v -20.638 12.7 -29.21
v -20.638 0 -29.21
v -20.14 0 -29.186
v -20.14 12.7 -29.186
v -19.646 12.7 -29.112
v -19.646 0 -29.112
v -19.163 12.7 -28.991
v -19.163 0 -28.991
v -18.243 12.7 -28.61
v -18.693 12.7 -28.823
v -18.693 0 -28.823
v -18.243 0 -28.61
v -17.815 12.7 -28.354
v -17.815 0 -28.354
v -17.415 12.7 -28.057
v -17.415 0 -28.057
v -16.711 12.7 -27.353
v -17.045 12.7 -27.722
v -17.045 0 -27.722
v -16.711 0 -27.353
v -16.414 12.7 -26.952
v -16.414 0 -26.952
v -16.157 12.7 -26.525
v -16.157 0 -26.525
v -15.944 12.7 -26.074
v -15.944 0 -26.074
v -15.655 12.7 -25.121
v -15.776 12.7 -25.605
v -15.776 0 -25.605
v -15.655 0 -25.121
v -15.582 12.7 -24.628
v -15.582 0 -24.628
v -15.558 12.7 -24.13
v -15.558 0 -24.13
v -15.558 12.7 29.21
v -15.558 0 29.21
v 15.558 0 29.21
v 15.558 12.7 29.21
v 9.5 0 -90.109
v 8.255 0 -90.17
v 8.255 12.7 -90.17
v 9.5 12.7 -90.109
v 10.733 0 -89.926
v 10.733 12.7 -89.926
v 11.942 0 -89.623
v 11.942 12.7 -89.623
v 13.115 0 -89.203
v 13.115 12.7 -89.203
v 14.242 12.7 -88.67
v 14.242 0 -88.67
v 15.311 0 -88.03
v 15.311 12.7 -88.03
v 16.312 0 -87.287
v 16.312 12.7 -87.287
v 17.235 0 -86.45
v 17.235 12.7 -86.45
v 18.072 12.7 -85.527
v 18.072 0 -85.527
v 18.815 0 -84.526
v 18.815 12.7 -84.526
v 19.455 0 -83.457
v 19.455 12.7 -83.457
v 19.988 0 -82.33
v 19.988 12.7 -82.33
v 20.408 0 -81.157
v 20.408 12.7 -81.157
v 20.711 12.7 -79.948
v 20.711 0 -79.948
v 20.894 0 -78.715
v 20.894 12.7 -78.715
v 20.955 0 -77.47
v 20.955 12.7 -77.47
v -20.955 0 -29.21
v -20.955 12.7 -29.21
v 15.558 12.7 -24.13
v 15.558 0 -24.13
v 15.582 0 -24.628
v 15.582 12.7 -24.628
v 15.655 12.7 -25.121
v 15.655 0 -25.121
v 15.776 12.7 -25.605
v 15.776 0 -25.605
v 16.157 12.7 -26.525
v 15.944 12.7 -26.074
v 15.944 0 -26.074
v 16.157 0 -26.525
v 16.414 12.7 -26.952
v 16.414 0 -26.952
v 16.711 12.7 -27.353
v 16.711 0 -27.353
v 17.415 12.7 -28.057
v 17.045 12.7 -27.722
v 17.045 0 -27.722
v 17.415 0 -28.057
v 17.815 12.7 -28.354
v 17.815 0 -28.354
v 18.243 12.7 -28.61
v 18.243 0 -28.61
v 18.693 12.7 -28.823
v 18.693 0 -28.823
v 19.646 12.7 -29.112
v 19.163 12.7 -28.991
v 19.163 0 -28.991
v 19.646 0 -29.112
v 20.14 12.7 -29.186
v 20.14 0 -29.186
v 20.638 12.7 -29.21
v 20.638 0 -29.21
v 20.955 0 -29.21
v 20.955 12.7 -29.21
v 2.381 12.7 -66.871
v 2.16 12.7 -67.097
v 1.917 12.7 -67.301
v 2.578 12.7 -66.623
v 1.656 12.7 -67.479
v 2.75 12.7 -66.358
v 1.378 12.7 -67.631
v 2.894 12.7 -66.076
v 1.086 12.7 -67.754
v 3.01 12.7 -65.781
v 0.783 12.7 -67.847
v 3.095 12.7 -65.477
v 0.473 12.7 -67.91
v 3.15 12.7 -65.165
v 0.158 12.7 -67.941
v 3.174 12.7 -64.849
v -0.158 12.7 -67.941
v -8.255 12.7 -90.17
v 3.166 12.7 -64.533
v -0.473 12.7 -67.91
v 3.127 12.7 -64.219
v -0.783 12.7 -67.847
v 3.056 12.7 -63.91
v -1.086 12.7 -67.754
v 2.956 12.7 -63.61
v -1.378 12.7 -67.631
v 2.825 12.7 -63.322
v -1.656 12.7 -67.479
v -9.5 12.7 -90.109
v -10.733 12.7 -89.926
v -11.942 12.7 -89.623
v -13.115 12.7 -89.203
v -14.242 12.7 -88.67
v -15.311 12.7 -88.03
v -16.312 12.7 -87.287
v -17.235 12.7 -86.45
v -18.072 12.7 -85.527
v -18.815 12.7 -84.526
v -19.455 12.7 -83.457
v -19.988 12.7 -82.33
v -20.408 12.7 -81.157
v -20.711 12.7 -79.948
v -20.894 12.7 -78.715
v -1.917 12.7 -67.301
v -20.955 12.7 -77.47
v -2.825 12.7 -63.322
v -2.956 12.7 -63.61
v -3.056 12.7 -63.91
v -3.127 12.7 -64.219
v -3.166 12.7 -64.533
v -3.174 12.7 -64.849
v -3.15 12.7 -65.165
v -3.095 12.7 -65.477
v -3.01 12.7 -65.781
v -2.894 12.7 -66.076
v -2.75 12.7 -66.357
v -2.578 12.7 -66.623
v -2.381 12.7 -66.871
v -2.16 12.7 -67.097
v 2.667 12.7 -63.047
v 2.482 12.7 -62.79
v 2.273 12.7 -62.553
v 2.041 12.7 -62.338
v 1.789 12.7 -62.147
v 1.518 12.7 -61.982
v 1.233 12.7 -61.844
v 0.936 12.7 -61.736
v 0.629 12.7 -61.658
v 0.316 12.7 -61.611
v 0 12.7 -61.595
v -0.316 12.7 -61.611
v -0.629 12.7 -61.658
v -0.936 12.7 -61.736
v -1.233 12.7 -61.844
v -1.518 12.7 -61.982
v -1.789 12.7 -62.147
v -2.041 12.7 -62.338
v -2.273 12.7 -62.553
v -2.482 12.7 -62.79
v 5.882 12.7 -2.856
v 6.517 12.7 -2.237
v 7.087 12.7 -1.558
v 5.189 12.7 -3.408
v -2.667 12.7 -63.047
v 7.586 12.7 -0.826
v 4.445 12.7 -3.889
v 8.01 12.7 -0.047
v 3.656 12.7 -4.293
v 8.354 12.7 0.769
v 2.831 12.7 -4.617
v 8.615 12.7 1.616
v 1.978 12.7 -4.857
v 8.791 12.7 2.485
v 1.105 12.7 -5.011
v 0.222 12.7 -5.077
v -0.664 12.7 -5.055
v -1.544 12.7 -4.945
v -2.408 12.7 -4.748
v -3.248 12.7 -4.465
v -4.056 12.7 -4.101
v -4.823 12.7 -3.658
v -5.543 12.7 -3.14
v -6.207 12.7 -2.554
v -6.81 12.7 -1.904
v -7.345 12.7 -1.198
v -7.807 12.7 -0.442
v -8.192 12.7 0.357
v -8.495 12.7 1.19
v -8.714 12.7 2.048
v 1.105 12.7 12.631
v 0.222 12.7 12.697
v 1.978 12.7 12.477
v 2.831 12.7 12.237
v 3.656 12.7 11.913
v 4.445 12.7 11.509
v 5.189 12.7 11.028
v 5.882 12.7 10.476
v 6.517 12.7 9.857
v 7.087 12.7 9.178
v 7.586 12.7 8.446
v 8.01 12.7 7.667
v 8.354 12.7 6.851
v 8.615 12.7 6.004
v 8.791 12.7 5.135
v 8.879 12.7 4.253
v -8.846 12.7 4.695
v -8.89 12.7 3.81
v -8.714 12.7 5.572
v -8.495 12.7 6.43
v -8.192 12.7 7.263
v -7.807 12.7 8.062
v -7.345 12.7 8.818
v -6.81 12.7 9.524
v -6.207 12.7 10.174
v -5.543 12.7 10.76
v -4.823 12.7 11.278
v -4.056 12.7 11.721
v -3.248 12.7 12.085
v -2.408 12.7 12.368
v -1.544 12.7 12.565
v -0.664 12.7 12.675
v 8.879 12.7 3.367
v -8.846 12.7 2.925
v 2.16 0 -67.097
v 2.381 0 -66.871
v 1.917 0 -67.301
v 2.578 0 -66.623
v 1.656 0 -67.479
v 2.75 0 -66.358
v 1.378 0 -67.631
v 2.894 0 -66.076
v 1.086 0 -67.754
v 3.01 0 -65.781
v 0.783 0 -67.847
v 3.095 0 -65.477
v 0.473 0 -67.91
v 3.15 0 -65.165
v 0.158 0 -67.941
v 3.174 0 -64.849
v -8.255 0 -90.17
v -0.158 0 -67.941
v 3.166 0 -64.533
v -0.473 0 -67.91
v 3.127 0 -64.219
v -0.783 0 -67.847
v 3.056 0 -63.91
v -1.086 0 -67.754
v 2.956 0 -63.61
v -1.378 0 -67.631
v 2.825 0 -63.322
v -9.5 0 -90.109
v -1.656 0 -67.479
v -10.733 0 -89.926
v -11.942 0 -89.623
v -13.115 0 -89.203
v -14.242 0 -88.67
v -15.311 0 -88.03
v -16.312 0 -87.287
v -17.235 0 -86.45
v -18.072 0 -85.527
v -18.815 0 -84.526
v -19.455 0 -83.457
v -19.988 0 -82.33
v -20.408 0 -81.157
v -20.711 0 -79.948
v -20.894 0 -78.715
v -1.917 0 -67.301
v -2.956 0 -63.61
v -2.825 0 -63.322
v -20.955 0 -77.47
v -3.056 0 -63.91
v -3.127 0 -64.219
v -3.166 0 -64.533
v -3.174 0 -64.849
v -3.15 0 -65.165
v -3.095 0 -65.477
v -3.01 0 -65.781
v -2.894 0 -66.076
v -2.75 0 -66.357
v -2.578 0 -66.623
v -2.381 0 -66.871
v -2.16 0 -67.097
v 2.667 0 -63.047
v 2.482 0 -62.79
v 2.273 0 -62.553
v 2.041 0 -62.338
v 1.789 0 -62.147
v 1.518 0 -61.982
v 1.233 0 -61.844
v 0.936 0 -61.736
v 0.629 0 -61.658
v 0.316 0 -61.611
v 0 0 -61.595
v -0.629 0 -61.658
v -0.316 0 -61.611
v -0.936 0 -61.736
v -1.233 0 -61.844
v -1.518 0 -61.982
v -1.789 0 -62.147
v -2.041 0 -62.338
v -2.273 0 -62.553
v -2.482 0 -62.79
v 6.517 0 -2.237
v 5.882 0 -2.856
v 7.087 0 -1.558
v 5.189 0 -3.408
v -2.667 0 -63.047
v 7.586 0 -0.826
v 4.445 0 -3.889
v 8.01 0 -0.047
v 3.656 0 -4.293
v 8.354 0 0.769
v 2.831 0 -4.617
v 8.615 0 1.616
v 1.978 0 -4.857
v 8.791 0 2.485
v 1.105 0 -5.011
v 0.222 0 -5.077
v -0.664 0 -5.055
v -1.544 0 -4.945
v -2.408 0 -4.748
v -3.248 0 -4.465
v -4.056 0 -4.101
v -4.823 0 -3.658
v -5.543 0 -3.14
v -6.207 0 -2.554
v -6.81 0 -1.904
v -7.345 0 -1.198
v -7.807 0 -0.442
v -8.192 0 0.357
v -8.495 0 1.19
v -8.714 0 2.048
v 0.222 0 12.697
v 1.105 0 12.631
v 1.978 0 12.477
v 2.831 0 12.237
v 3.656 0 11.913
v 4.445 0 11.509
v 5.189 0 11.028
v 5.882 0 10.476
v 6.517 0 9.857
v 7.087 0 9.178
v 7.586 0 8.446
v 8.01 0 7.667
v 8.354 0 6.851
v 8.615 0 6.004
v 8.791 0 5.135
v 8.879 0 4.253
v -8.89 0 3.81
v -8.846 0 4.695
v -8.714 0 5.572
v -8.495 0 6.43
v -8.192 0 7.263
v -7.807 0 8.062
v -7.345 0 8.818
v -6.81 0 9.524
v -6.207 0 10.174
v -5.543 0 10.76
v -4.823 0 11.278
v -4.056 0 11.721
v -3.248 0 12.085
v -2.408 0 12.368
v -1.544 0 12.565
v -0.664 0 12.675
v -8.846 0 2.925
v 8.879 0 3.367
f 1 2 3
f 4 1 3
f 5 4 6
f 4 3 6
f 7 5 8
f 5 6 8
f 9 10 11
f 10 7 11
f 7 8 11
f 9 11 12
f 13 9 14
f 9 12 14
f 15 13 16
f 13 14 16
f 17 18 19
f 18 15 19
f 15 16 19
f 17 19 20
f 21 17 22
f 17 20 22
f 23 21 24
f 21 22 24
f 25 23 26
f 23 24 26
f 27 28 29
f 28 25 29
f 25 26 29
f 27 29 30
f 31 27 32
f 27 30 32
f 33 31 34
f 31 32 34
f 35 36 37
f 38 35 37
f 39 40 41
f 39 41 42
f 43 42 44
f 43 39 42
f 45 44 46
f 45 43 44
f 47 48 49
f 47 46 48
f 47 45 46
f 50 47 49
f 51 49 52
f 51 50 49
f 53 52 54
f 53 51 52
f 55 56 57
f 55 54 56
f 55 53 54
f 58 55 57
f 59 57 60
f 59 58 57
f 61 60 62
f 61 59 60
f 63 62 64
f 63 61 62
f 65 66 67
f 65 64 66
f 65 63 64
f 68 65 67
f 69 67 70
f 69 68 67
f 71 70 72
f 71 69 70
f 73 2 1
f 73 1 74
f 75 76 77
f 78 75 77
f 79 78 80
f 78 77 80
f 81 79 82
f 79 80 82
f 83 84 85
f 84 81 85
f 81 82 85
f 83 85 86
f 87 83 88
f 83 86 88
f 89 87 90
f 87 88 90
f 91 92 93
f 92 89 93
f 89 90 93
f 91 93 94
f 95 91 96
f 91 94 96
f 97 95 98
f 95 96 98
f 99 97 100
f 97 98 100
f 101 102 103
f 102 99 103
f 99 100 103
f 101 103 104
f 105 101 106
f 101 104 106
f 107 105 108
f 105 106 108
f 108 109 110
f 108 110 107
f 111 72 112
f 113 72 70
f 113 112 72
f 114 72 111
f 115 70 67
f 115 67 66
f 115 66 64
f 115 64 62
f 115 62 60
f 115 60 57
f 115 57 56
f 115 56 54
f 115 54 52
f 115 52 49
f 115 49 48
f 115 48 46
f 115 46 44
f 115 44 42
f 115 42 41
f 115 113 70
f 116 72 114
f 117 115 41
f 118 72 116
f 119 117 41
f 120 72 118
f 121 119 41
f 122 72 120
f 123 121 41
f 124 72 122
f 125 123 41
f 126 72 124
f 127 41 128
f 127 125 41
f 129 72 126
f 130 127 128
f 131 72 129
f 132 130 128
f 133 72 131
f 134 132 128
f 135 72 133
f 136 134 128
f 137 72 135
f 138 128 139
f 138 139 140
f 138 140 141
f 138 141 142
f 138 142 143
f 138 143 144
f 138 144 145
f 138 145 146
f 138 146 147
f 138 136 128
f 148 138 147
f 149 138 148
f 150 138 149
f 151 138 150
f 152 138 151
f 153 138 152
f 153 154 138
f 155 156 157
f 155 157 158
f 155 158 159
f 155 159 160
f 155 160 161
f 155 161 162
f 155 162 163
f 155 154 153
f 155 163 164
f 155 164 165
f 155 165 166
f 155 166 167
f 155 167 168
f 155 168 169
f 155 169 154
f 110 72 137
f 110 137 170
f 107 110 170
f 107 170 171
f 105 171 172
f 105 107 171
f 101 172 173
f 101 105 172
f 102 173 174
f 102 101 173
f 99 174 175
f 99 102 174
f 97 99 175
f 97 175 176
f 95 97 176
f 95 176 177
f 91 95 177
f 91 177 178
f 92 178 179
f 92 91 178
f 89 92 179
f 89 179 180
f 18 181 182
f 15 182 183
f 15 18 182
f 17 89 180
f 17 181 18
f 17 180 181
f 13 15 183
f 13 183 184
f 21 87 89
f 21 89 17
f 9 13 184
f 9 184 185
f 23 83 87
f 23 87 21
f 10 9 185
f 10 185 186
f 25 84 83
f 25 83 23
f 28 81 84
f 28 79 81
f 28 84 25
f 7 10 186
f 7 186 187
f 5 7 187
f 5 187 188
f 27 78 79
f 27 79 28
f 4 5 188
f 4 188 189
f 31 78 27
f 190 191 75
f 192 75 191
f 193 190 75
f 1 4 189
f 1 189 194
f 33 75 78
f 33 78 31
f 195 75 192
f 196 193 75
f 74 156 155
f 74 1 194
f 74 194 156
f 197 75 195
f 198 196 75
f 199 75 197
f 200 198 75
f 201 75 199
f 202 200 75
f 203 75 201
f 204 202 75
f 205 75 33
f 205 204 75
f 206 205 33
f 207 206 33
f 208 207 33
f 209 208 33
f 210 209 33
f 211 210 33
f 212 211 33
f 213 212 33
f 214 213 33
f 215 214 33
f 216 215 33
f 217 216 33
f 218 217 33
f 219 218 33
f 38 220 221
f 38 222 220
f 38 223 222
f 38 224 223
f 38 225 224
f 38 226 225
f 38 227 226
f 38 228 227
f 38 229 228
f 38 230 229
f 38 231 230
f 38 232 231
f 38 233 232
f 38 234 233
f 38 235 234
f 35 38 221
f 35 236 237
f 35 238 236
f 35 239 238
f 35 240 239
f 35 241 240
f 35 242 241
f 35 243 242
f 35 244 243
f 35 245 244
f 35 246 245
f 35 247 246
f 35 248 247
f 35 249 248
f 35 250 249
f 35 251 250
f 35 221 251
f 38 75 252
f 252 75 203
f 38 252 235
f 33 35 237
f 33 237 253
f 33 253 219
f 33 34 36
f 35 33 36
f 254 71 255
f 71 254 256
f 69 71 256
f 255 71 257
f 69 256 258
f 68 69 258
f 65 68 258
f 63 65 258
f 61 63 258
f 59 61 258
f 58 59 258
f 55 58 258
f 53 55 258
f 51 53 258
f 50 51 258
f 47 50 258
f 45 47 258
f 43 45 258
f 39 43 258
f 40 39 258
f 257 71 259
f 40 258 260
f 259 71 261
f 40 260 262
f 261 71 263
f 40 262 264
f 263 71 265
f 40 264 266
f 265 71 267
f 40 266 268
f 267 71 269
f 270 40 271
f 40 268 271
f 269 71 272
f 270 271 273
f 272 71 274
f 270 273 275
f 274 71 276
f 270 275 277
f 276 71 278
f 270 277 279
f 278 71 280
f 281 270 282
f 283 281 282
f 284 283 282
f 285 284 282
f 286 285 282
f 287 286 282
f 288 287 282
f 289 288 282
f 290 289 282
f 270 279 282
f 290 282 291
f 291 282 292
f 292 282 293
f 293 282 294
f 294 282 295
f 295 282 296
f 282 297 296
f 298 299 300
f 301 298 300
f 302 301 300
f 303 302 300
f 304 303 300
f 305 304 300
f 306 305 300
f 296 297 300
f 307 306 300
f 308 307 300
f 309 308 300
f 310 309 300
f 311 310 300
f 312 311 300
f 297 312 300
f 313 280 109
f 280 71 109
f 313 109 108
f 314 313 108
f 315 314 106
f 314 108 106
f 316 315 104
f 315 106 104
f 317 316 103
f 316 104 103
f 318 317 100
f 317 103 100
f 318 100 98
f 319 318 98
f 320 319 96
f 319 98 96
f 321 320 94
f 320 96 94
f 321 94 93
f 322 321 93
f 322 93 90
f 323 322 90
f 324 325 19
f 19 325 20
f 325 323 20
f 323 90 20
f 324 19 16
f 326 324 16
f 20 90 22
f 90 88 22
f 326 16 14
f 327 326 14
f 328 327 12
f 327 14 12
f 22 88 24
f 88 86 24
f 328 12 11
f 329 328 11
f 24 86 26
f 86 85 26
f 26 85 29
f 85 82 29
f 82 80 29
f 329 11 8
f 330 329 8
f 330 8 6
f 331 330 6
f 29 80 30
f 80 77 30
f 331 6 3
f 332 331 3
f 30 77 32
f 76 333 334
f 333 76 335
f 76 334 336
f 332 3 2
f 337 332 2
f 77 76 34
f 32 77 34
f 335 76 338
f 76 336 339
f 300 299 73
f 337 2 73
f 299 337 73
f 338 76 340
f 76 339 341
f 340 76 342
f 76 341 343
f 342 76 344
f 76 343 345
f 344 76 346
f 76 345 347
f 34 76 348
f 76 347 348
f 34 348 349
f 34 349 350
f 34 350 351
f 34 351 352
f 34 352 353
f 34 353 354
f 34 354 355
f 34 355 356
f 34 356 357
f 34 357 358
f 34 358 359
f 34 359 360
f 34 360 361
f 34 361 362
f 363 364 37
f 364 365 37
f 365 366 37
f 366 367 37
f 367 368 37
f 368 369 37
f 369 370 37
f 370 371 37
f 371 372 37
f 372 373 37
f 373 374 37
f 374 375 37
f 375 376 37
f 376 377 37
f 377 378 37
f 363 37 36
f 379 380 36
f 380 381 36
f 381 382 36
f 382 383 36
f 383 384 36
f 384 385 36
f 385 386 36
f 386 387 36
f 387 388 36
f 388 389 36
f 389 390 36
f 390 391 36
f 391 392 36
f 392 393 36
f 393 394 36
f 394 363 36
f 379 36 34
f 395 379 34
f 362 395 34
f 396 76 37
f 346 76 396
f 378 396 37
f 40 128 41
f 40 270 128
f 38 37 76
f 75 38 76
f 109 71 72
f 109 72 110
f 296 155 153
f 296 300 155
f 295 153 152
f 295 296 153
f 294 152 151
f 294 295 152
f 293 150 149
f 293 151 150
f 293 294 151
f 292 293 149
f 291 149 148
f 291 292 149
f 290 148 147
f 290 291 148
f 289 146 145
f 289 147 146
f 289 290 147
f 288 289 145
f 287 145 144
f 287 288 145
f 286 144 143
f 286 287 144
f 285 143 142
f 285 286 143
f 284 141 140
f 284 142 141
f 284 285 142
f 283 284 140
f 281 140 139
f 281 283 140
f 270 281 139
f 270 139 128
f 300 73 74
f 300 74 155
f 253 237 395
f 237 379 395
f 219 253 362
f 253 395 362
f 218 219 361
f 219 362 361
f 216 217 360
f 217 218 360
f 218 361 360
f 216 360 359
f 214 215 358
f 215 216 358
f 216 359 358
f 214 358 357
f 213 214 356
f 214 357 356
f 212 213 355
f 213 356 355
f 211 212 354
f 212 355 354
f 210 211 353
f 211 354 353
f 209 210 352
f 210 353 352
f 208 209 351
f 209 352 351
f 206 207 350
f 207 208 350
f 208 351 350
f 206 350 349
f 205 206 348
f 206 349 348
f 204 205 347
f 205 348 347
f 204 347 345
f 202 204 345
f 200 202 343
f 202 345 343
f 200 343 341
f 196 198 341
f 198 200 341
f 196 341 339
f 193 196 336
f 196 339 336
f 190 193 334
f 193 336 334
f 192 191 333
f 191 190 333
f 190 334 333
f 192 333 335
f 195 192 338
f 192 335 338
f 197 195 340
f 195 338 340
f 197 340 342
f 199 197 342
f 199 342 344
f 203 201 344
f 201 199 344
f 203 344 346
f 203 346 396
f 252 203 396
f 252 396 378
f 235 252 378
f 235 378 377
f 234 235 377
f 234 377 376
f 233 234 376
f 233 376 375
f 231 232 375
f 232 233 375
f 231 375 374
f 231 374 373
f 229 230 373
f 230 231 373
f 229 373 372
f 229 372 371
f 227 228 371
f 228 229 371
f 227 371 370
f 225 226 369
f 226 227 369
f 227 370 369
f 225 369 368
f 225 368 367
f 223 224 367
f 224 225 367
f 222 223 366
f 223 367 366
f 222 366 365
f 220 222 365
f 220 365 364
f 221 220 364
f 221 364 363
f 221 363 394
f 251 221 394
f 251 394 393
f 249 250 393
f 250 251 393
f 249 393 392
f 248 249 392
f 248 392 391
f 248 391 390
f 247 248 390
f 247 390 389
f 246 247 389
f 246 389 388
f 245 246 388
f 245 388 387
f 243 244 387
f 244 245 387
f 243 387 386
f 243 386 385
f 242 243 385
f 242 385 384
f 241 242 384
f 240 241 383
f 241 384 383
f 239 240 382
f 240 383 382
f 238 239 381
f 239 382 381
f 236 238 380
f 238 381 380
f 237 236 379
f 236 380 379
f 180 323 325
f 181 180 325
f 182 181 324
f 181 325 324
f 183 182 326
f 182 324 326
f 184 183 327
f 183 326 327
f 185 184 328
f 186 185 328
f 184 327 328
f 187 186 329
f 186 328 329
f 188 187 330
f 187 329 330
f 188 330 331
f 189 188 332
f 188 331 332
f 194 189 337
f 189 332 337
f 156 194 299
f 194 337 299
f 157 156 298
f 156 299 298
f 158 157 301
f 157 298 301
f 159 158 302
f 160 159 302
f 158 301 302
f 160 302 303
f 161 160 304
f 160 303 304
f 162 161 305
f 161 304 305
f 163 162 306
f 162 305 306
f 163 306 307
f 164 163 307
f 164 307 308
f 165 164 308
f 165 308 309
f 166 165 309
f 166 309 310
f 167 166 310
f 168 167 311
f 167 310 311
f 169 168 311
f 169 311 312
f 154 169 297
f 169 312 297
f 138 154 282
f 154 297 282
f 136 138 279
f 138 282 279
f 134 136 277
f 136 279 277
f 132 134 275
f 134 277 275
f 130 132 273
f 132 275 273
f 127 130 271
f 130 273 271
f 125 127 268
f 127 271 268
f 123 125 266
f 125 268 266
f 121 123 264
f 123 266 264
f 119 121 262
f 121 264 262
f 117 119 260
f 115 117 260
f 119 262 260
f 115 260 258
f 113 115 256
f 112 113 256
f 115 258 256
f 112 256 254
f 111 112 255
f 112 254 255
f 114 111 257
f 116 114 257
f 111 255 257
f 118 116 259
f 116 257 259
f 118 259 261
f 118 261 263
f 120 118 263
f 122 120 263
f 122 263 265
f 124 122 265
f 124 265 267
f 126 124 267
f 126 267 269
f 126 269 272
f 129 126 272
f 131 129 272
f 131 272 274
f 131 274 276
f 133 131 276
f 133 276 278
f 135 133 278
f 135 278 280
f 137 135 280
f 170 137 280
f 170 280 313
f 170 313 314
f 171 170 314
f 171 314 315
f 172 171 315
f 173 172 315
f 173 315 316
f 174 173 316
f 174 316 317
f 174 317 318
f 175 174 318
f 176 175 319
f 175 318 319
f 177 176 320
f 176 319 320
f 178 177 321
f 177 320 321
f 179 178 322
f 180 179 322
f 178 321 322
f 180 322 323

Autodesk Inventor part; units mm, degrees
ref_plane "YZ Plane" through (0, 0, 0) normal (1, 0, 0) x (0, 1, 0)
ref_plane "XZ Plane" through (0, 0, 0) normal (0, 1, 0) x (-1, 0, 0)
ref_plane "XY Plane" through (0, 0, 0) normal (0, 0, 1) x (1, 0, 0)
sketch "Sketch1" plane through (0, 0, 0) normal (0, 1, 0) x (-1, 0, 0)
  line L0 (15.5575, -24.13) -> (15.5575, 29.21)
  line L1 (15.5575, 29.21) -> (-15.5575, 29.21)
  line L2 (-15.5575, 29.21) -> (-15.5575, -24.13)
  line L3 (-15.5575, -29.21) -> (15.5575, 29.21) construction
  line L4 (15.5575, -29.21) -> (-15.5575, 29.21) construction
  line L5 (20.6375, -29.21) -> (20.955, -29.21)
  line L6 (20.955, -29.21) -> (20.955, -77.47)
  line L7 (8.255, -90.17) -> (-8.255, -90.17)
  line L8 (-20.955, -77.47) -> (-20.955, -29.21)
  line L9 (-20.955, -29.21) -> (-20.6375, -29.21)
  arc A0 (15.5575, -24.13) -> (20.6375, -29.21) centre (20.6375, -24.13) ccw
  arc A1 (-20.6375, -29.21) -> (-15.5575, -24.13) centre (-20.6375, -24.13) ccw
  circle A2 centre (0, 3.81) radius 8.89
  arc A3 (8.255, -90.17) -> (20.955, -77.47) centre (8.255, -77.47) ccw
  arc A4 (-20.955, -77.47) -> (-8.255, -90.17) centre (-8.255, -77.47) ccw
  point P0 (0, 0)
  point P1 (20.955, -90.17)
  point P2 (-20.955, -90.17)
  dimension "d0" = 5.08
  dimension "d1" = 31.115
  dimension "d2" = 41.91
  dimension "d3" = 60.96
  dimension "d4" = 119.38
  dimension "d5" = 17.78
  dimension "d6" = 25.4
  dimension "d7" = 12.7
extrude "Extrusion1" add sketch "Sketch1" along normal blind 12.7
sketch "Sketch2" plane through (0, 12.7, 0) normal (0, 1, 0) x (1, 0, 0)
  line L0 (-8.255, 90.17) -> (8.255, 90.17) projected
  point P0 (0, 0)
  point P1 (0, 64.77)
  dimension "d19" = 25.4
hole "Hole2" at (0, 12.7, -64.77) direction (0, -1, 0) diameter 6.35 end through all
properties part number "Fixture_Airpot_Support"
